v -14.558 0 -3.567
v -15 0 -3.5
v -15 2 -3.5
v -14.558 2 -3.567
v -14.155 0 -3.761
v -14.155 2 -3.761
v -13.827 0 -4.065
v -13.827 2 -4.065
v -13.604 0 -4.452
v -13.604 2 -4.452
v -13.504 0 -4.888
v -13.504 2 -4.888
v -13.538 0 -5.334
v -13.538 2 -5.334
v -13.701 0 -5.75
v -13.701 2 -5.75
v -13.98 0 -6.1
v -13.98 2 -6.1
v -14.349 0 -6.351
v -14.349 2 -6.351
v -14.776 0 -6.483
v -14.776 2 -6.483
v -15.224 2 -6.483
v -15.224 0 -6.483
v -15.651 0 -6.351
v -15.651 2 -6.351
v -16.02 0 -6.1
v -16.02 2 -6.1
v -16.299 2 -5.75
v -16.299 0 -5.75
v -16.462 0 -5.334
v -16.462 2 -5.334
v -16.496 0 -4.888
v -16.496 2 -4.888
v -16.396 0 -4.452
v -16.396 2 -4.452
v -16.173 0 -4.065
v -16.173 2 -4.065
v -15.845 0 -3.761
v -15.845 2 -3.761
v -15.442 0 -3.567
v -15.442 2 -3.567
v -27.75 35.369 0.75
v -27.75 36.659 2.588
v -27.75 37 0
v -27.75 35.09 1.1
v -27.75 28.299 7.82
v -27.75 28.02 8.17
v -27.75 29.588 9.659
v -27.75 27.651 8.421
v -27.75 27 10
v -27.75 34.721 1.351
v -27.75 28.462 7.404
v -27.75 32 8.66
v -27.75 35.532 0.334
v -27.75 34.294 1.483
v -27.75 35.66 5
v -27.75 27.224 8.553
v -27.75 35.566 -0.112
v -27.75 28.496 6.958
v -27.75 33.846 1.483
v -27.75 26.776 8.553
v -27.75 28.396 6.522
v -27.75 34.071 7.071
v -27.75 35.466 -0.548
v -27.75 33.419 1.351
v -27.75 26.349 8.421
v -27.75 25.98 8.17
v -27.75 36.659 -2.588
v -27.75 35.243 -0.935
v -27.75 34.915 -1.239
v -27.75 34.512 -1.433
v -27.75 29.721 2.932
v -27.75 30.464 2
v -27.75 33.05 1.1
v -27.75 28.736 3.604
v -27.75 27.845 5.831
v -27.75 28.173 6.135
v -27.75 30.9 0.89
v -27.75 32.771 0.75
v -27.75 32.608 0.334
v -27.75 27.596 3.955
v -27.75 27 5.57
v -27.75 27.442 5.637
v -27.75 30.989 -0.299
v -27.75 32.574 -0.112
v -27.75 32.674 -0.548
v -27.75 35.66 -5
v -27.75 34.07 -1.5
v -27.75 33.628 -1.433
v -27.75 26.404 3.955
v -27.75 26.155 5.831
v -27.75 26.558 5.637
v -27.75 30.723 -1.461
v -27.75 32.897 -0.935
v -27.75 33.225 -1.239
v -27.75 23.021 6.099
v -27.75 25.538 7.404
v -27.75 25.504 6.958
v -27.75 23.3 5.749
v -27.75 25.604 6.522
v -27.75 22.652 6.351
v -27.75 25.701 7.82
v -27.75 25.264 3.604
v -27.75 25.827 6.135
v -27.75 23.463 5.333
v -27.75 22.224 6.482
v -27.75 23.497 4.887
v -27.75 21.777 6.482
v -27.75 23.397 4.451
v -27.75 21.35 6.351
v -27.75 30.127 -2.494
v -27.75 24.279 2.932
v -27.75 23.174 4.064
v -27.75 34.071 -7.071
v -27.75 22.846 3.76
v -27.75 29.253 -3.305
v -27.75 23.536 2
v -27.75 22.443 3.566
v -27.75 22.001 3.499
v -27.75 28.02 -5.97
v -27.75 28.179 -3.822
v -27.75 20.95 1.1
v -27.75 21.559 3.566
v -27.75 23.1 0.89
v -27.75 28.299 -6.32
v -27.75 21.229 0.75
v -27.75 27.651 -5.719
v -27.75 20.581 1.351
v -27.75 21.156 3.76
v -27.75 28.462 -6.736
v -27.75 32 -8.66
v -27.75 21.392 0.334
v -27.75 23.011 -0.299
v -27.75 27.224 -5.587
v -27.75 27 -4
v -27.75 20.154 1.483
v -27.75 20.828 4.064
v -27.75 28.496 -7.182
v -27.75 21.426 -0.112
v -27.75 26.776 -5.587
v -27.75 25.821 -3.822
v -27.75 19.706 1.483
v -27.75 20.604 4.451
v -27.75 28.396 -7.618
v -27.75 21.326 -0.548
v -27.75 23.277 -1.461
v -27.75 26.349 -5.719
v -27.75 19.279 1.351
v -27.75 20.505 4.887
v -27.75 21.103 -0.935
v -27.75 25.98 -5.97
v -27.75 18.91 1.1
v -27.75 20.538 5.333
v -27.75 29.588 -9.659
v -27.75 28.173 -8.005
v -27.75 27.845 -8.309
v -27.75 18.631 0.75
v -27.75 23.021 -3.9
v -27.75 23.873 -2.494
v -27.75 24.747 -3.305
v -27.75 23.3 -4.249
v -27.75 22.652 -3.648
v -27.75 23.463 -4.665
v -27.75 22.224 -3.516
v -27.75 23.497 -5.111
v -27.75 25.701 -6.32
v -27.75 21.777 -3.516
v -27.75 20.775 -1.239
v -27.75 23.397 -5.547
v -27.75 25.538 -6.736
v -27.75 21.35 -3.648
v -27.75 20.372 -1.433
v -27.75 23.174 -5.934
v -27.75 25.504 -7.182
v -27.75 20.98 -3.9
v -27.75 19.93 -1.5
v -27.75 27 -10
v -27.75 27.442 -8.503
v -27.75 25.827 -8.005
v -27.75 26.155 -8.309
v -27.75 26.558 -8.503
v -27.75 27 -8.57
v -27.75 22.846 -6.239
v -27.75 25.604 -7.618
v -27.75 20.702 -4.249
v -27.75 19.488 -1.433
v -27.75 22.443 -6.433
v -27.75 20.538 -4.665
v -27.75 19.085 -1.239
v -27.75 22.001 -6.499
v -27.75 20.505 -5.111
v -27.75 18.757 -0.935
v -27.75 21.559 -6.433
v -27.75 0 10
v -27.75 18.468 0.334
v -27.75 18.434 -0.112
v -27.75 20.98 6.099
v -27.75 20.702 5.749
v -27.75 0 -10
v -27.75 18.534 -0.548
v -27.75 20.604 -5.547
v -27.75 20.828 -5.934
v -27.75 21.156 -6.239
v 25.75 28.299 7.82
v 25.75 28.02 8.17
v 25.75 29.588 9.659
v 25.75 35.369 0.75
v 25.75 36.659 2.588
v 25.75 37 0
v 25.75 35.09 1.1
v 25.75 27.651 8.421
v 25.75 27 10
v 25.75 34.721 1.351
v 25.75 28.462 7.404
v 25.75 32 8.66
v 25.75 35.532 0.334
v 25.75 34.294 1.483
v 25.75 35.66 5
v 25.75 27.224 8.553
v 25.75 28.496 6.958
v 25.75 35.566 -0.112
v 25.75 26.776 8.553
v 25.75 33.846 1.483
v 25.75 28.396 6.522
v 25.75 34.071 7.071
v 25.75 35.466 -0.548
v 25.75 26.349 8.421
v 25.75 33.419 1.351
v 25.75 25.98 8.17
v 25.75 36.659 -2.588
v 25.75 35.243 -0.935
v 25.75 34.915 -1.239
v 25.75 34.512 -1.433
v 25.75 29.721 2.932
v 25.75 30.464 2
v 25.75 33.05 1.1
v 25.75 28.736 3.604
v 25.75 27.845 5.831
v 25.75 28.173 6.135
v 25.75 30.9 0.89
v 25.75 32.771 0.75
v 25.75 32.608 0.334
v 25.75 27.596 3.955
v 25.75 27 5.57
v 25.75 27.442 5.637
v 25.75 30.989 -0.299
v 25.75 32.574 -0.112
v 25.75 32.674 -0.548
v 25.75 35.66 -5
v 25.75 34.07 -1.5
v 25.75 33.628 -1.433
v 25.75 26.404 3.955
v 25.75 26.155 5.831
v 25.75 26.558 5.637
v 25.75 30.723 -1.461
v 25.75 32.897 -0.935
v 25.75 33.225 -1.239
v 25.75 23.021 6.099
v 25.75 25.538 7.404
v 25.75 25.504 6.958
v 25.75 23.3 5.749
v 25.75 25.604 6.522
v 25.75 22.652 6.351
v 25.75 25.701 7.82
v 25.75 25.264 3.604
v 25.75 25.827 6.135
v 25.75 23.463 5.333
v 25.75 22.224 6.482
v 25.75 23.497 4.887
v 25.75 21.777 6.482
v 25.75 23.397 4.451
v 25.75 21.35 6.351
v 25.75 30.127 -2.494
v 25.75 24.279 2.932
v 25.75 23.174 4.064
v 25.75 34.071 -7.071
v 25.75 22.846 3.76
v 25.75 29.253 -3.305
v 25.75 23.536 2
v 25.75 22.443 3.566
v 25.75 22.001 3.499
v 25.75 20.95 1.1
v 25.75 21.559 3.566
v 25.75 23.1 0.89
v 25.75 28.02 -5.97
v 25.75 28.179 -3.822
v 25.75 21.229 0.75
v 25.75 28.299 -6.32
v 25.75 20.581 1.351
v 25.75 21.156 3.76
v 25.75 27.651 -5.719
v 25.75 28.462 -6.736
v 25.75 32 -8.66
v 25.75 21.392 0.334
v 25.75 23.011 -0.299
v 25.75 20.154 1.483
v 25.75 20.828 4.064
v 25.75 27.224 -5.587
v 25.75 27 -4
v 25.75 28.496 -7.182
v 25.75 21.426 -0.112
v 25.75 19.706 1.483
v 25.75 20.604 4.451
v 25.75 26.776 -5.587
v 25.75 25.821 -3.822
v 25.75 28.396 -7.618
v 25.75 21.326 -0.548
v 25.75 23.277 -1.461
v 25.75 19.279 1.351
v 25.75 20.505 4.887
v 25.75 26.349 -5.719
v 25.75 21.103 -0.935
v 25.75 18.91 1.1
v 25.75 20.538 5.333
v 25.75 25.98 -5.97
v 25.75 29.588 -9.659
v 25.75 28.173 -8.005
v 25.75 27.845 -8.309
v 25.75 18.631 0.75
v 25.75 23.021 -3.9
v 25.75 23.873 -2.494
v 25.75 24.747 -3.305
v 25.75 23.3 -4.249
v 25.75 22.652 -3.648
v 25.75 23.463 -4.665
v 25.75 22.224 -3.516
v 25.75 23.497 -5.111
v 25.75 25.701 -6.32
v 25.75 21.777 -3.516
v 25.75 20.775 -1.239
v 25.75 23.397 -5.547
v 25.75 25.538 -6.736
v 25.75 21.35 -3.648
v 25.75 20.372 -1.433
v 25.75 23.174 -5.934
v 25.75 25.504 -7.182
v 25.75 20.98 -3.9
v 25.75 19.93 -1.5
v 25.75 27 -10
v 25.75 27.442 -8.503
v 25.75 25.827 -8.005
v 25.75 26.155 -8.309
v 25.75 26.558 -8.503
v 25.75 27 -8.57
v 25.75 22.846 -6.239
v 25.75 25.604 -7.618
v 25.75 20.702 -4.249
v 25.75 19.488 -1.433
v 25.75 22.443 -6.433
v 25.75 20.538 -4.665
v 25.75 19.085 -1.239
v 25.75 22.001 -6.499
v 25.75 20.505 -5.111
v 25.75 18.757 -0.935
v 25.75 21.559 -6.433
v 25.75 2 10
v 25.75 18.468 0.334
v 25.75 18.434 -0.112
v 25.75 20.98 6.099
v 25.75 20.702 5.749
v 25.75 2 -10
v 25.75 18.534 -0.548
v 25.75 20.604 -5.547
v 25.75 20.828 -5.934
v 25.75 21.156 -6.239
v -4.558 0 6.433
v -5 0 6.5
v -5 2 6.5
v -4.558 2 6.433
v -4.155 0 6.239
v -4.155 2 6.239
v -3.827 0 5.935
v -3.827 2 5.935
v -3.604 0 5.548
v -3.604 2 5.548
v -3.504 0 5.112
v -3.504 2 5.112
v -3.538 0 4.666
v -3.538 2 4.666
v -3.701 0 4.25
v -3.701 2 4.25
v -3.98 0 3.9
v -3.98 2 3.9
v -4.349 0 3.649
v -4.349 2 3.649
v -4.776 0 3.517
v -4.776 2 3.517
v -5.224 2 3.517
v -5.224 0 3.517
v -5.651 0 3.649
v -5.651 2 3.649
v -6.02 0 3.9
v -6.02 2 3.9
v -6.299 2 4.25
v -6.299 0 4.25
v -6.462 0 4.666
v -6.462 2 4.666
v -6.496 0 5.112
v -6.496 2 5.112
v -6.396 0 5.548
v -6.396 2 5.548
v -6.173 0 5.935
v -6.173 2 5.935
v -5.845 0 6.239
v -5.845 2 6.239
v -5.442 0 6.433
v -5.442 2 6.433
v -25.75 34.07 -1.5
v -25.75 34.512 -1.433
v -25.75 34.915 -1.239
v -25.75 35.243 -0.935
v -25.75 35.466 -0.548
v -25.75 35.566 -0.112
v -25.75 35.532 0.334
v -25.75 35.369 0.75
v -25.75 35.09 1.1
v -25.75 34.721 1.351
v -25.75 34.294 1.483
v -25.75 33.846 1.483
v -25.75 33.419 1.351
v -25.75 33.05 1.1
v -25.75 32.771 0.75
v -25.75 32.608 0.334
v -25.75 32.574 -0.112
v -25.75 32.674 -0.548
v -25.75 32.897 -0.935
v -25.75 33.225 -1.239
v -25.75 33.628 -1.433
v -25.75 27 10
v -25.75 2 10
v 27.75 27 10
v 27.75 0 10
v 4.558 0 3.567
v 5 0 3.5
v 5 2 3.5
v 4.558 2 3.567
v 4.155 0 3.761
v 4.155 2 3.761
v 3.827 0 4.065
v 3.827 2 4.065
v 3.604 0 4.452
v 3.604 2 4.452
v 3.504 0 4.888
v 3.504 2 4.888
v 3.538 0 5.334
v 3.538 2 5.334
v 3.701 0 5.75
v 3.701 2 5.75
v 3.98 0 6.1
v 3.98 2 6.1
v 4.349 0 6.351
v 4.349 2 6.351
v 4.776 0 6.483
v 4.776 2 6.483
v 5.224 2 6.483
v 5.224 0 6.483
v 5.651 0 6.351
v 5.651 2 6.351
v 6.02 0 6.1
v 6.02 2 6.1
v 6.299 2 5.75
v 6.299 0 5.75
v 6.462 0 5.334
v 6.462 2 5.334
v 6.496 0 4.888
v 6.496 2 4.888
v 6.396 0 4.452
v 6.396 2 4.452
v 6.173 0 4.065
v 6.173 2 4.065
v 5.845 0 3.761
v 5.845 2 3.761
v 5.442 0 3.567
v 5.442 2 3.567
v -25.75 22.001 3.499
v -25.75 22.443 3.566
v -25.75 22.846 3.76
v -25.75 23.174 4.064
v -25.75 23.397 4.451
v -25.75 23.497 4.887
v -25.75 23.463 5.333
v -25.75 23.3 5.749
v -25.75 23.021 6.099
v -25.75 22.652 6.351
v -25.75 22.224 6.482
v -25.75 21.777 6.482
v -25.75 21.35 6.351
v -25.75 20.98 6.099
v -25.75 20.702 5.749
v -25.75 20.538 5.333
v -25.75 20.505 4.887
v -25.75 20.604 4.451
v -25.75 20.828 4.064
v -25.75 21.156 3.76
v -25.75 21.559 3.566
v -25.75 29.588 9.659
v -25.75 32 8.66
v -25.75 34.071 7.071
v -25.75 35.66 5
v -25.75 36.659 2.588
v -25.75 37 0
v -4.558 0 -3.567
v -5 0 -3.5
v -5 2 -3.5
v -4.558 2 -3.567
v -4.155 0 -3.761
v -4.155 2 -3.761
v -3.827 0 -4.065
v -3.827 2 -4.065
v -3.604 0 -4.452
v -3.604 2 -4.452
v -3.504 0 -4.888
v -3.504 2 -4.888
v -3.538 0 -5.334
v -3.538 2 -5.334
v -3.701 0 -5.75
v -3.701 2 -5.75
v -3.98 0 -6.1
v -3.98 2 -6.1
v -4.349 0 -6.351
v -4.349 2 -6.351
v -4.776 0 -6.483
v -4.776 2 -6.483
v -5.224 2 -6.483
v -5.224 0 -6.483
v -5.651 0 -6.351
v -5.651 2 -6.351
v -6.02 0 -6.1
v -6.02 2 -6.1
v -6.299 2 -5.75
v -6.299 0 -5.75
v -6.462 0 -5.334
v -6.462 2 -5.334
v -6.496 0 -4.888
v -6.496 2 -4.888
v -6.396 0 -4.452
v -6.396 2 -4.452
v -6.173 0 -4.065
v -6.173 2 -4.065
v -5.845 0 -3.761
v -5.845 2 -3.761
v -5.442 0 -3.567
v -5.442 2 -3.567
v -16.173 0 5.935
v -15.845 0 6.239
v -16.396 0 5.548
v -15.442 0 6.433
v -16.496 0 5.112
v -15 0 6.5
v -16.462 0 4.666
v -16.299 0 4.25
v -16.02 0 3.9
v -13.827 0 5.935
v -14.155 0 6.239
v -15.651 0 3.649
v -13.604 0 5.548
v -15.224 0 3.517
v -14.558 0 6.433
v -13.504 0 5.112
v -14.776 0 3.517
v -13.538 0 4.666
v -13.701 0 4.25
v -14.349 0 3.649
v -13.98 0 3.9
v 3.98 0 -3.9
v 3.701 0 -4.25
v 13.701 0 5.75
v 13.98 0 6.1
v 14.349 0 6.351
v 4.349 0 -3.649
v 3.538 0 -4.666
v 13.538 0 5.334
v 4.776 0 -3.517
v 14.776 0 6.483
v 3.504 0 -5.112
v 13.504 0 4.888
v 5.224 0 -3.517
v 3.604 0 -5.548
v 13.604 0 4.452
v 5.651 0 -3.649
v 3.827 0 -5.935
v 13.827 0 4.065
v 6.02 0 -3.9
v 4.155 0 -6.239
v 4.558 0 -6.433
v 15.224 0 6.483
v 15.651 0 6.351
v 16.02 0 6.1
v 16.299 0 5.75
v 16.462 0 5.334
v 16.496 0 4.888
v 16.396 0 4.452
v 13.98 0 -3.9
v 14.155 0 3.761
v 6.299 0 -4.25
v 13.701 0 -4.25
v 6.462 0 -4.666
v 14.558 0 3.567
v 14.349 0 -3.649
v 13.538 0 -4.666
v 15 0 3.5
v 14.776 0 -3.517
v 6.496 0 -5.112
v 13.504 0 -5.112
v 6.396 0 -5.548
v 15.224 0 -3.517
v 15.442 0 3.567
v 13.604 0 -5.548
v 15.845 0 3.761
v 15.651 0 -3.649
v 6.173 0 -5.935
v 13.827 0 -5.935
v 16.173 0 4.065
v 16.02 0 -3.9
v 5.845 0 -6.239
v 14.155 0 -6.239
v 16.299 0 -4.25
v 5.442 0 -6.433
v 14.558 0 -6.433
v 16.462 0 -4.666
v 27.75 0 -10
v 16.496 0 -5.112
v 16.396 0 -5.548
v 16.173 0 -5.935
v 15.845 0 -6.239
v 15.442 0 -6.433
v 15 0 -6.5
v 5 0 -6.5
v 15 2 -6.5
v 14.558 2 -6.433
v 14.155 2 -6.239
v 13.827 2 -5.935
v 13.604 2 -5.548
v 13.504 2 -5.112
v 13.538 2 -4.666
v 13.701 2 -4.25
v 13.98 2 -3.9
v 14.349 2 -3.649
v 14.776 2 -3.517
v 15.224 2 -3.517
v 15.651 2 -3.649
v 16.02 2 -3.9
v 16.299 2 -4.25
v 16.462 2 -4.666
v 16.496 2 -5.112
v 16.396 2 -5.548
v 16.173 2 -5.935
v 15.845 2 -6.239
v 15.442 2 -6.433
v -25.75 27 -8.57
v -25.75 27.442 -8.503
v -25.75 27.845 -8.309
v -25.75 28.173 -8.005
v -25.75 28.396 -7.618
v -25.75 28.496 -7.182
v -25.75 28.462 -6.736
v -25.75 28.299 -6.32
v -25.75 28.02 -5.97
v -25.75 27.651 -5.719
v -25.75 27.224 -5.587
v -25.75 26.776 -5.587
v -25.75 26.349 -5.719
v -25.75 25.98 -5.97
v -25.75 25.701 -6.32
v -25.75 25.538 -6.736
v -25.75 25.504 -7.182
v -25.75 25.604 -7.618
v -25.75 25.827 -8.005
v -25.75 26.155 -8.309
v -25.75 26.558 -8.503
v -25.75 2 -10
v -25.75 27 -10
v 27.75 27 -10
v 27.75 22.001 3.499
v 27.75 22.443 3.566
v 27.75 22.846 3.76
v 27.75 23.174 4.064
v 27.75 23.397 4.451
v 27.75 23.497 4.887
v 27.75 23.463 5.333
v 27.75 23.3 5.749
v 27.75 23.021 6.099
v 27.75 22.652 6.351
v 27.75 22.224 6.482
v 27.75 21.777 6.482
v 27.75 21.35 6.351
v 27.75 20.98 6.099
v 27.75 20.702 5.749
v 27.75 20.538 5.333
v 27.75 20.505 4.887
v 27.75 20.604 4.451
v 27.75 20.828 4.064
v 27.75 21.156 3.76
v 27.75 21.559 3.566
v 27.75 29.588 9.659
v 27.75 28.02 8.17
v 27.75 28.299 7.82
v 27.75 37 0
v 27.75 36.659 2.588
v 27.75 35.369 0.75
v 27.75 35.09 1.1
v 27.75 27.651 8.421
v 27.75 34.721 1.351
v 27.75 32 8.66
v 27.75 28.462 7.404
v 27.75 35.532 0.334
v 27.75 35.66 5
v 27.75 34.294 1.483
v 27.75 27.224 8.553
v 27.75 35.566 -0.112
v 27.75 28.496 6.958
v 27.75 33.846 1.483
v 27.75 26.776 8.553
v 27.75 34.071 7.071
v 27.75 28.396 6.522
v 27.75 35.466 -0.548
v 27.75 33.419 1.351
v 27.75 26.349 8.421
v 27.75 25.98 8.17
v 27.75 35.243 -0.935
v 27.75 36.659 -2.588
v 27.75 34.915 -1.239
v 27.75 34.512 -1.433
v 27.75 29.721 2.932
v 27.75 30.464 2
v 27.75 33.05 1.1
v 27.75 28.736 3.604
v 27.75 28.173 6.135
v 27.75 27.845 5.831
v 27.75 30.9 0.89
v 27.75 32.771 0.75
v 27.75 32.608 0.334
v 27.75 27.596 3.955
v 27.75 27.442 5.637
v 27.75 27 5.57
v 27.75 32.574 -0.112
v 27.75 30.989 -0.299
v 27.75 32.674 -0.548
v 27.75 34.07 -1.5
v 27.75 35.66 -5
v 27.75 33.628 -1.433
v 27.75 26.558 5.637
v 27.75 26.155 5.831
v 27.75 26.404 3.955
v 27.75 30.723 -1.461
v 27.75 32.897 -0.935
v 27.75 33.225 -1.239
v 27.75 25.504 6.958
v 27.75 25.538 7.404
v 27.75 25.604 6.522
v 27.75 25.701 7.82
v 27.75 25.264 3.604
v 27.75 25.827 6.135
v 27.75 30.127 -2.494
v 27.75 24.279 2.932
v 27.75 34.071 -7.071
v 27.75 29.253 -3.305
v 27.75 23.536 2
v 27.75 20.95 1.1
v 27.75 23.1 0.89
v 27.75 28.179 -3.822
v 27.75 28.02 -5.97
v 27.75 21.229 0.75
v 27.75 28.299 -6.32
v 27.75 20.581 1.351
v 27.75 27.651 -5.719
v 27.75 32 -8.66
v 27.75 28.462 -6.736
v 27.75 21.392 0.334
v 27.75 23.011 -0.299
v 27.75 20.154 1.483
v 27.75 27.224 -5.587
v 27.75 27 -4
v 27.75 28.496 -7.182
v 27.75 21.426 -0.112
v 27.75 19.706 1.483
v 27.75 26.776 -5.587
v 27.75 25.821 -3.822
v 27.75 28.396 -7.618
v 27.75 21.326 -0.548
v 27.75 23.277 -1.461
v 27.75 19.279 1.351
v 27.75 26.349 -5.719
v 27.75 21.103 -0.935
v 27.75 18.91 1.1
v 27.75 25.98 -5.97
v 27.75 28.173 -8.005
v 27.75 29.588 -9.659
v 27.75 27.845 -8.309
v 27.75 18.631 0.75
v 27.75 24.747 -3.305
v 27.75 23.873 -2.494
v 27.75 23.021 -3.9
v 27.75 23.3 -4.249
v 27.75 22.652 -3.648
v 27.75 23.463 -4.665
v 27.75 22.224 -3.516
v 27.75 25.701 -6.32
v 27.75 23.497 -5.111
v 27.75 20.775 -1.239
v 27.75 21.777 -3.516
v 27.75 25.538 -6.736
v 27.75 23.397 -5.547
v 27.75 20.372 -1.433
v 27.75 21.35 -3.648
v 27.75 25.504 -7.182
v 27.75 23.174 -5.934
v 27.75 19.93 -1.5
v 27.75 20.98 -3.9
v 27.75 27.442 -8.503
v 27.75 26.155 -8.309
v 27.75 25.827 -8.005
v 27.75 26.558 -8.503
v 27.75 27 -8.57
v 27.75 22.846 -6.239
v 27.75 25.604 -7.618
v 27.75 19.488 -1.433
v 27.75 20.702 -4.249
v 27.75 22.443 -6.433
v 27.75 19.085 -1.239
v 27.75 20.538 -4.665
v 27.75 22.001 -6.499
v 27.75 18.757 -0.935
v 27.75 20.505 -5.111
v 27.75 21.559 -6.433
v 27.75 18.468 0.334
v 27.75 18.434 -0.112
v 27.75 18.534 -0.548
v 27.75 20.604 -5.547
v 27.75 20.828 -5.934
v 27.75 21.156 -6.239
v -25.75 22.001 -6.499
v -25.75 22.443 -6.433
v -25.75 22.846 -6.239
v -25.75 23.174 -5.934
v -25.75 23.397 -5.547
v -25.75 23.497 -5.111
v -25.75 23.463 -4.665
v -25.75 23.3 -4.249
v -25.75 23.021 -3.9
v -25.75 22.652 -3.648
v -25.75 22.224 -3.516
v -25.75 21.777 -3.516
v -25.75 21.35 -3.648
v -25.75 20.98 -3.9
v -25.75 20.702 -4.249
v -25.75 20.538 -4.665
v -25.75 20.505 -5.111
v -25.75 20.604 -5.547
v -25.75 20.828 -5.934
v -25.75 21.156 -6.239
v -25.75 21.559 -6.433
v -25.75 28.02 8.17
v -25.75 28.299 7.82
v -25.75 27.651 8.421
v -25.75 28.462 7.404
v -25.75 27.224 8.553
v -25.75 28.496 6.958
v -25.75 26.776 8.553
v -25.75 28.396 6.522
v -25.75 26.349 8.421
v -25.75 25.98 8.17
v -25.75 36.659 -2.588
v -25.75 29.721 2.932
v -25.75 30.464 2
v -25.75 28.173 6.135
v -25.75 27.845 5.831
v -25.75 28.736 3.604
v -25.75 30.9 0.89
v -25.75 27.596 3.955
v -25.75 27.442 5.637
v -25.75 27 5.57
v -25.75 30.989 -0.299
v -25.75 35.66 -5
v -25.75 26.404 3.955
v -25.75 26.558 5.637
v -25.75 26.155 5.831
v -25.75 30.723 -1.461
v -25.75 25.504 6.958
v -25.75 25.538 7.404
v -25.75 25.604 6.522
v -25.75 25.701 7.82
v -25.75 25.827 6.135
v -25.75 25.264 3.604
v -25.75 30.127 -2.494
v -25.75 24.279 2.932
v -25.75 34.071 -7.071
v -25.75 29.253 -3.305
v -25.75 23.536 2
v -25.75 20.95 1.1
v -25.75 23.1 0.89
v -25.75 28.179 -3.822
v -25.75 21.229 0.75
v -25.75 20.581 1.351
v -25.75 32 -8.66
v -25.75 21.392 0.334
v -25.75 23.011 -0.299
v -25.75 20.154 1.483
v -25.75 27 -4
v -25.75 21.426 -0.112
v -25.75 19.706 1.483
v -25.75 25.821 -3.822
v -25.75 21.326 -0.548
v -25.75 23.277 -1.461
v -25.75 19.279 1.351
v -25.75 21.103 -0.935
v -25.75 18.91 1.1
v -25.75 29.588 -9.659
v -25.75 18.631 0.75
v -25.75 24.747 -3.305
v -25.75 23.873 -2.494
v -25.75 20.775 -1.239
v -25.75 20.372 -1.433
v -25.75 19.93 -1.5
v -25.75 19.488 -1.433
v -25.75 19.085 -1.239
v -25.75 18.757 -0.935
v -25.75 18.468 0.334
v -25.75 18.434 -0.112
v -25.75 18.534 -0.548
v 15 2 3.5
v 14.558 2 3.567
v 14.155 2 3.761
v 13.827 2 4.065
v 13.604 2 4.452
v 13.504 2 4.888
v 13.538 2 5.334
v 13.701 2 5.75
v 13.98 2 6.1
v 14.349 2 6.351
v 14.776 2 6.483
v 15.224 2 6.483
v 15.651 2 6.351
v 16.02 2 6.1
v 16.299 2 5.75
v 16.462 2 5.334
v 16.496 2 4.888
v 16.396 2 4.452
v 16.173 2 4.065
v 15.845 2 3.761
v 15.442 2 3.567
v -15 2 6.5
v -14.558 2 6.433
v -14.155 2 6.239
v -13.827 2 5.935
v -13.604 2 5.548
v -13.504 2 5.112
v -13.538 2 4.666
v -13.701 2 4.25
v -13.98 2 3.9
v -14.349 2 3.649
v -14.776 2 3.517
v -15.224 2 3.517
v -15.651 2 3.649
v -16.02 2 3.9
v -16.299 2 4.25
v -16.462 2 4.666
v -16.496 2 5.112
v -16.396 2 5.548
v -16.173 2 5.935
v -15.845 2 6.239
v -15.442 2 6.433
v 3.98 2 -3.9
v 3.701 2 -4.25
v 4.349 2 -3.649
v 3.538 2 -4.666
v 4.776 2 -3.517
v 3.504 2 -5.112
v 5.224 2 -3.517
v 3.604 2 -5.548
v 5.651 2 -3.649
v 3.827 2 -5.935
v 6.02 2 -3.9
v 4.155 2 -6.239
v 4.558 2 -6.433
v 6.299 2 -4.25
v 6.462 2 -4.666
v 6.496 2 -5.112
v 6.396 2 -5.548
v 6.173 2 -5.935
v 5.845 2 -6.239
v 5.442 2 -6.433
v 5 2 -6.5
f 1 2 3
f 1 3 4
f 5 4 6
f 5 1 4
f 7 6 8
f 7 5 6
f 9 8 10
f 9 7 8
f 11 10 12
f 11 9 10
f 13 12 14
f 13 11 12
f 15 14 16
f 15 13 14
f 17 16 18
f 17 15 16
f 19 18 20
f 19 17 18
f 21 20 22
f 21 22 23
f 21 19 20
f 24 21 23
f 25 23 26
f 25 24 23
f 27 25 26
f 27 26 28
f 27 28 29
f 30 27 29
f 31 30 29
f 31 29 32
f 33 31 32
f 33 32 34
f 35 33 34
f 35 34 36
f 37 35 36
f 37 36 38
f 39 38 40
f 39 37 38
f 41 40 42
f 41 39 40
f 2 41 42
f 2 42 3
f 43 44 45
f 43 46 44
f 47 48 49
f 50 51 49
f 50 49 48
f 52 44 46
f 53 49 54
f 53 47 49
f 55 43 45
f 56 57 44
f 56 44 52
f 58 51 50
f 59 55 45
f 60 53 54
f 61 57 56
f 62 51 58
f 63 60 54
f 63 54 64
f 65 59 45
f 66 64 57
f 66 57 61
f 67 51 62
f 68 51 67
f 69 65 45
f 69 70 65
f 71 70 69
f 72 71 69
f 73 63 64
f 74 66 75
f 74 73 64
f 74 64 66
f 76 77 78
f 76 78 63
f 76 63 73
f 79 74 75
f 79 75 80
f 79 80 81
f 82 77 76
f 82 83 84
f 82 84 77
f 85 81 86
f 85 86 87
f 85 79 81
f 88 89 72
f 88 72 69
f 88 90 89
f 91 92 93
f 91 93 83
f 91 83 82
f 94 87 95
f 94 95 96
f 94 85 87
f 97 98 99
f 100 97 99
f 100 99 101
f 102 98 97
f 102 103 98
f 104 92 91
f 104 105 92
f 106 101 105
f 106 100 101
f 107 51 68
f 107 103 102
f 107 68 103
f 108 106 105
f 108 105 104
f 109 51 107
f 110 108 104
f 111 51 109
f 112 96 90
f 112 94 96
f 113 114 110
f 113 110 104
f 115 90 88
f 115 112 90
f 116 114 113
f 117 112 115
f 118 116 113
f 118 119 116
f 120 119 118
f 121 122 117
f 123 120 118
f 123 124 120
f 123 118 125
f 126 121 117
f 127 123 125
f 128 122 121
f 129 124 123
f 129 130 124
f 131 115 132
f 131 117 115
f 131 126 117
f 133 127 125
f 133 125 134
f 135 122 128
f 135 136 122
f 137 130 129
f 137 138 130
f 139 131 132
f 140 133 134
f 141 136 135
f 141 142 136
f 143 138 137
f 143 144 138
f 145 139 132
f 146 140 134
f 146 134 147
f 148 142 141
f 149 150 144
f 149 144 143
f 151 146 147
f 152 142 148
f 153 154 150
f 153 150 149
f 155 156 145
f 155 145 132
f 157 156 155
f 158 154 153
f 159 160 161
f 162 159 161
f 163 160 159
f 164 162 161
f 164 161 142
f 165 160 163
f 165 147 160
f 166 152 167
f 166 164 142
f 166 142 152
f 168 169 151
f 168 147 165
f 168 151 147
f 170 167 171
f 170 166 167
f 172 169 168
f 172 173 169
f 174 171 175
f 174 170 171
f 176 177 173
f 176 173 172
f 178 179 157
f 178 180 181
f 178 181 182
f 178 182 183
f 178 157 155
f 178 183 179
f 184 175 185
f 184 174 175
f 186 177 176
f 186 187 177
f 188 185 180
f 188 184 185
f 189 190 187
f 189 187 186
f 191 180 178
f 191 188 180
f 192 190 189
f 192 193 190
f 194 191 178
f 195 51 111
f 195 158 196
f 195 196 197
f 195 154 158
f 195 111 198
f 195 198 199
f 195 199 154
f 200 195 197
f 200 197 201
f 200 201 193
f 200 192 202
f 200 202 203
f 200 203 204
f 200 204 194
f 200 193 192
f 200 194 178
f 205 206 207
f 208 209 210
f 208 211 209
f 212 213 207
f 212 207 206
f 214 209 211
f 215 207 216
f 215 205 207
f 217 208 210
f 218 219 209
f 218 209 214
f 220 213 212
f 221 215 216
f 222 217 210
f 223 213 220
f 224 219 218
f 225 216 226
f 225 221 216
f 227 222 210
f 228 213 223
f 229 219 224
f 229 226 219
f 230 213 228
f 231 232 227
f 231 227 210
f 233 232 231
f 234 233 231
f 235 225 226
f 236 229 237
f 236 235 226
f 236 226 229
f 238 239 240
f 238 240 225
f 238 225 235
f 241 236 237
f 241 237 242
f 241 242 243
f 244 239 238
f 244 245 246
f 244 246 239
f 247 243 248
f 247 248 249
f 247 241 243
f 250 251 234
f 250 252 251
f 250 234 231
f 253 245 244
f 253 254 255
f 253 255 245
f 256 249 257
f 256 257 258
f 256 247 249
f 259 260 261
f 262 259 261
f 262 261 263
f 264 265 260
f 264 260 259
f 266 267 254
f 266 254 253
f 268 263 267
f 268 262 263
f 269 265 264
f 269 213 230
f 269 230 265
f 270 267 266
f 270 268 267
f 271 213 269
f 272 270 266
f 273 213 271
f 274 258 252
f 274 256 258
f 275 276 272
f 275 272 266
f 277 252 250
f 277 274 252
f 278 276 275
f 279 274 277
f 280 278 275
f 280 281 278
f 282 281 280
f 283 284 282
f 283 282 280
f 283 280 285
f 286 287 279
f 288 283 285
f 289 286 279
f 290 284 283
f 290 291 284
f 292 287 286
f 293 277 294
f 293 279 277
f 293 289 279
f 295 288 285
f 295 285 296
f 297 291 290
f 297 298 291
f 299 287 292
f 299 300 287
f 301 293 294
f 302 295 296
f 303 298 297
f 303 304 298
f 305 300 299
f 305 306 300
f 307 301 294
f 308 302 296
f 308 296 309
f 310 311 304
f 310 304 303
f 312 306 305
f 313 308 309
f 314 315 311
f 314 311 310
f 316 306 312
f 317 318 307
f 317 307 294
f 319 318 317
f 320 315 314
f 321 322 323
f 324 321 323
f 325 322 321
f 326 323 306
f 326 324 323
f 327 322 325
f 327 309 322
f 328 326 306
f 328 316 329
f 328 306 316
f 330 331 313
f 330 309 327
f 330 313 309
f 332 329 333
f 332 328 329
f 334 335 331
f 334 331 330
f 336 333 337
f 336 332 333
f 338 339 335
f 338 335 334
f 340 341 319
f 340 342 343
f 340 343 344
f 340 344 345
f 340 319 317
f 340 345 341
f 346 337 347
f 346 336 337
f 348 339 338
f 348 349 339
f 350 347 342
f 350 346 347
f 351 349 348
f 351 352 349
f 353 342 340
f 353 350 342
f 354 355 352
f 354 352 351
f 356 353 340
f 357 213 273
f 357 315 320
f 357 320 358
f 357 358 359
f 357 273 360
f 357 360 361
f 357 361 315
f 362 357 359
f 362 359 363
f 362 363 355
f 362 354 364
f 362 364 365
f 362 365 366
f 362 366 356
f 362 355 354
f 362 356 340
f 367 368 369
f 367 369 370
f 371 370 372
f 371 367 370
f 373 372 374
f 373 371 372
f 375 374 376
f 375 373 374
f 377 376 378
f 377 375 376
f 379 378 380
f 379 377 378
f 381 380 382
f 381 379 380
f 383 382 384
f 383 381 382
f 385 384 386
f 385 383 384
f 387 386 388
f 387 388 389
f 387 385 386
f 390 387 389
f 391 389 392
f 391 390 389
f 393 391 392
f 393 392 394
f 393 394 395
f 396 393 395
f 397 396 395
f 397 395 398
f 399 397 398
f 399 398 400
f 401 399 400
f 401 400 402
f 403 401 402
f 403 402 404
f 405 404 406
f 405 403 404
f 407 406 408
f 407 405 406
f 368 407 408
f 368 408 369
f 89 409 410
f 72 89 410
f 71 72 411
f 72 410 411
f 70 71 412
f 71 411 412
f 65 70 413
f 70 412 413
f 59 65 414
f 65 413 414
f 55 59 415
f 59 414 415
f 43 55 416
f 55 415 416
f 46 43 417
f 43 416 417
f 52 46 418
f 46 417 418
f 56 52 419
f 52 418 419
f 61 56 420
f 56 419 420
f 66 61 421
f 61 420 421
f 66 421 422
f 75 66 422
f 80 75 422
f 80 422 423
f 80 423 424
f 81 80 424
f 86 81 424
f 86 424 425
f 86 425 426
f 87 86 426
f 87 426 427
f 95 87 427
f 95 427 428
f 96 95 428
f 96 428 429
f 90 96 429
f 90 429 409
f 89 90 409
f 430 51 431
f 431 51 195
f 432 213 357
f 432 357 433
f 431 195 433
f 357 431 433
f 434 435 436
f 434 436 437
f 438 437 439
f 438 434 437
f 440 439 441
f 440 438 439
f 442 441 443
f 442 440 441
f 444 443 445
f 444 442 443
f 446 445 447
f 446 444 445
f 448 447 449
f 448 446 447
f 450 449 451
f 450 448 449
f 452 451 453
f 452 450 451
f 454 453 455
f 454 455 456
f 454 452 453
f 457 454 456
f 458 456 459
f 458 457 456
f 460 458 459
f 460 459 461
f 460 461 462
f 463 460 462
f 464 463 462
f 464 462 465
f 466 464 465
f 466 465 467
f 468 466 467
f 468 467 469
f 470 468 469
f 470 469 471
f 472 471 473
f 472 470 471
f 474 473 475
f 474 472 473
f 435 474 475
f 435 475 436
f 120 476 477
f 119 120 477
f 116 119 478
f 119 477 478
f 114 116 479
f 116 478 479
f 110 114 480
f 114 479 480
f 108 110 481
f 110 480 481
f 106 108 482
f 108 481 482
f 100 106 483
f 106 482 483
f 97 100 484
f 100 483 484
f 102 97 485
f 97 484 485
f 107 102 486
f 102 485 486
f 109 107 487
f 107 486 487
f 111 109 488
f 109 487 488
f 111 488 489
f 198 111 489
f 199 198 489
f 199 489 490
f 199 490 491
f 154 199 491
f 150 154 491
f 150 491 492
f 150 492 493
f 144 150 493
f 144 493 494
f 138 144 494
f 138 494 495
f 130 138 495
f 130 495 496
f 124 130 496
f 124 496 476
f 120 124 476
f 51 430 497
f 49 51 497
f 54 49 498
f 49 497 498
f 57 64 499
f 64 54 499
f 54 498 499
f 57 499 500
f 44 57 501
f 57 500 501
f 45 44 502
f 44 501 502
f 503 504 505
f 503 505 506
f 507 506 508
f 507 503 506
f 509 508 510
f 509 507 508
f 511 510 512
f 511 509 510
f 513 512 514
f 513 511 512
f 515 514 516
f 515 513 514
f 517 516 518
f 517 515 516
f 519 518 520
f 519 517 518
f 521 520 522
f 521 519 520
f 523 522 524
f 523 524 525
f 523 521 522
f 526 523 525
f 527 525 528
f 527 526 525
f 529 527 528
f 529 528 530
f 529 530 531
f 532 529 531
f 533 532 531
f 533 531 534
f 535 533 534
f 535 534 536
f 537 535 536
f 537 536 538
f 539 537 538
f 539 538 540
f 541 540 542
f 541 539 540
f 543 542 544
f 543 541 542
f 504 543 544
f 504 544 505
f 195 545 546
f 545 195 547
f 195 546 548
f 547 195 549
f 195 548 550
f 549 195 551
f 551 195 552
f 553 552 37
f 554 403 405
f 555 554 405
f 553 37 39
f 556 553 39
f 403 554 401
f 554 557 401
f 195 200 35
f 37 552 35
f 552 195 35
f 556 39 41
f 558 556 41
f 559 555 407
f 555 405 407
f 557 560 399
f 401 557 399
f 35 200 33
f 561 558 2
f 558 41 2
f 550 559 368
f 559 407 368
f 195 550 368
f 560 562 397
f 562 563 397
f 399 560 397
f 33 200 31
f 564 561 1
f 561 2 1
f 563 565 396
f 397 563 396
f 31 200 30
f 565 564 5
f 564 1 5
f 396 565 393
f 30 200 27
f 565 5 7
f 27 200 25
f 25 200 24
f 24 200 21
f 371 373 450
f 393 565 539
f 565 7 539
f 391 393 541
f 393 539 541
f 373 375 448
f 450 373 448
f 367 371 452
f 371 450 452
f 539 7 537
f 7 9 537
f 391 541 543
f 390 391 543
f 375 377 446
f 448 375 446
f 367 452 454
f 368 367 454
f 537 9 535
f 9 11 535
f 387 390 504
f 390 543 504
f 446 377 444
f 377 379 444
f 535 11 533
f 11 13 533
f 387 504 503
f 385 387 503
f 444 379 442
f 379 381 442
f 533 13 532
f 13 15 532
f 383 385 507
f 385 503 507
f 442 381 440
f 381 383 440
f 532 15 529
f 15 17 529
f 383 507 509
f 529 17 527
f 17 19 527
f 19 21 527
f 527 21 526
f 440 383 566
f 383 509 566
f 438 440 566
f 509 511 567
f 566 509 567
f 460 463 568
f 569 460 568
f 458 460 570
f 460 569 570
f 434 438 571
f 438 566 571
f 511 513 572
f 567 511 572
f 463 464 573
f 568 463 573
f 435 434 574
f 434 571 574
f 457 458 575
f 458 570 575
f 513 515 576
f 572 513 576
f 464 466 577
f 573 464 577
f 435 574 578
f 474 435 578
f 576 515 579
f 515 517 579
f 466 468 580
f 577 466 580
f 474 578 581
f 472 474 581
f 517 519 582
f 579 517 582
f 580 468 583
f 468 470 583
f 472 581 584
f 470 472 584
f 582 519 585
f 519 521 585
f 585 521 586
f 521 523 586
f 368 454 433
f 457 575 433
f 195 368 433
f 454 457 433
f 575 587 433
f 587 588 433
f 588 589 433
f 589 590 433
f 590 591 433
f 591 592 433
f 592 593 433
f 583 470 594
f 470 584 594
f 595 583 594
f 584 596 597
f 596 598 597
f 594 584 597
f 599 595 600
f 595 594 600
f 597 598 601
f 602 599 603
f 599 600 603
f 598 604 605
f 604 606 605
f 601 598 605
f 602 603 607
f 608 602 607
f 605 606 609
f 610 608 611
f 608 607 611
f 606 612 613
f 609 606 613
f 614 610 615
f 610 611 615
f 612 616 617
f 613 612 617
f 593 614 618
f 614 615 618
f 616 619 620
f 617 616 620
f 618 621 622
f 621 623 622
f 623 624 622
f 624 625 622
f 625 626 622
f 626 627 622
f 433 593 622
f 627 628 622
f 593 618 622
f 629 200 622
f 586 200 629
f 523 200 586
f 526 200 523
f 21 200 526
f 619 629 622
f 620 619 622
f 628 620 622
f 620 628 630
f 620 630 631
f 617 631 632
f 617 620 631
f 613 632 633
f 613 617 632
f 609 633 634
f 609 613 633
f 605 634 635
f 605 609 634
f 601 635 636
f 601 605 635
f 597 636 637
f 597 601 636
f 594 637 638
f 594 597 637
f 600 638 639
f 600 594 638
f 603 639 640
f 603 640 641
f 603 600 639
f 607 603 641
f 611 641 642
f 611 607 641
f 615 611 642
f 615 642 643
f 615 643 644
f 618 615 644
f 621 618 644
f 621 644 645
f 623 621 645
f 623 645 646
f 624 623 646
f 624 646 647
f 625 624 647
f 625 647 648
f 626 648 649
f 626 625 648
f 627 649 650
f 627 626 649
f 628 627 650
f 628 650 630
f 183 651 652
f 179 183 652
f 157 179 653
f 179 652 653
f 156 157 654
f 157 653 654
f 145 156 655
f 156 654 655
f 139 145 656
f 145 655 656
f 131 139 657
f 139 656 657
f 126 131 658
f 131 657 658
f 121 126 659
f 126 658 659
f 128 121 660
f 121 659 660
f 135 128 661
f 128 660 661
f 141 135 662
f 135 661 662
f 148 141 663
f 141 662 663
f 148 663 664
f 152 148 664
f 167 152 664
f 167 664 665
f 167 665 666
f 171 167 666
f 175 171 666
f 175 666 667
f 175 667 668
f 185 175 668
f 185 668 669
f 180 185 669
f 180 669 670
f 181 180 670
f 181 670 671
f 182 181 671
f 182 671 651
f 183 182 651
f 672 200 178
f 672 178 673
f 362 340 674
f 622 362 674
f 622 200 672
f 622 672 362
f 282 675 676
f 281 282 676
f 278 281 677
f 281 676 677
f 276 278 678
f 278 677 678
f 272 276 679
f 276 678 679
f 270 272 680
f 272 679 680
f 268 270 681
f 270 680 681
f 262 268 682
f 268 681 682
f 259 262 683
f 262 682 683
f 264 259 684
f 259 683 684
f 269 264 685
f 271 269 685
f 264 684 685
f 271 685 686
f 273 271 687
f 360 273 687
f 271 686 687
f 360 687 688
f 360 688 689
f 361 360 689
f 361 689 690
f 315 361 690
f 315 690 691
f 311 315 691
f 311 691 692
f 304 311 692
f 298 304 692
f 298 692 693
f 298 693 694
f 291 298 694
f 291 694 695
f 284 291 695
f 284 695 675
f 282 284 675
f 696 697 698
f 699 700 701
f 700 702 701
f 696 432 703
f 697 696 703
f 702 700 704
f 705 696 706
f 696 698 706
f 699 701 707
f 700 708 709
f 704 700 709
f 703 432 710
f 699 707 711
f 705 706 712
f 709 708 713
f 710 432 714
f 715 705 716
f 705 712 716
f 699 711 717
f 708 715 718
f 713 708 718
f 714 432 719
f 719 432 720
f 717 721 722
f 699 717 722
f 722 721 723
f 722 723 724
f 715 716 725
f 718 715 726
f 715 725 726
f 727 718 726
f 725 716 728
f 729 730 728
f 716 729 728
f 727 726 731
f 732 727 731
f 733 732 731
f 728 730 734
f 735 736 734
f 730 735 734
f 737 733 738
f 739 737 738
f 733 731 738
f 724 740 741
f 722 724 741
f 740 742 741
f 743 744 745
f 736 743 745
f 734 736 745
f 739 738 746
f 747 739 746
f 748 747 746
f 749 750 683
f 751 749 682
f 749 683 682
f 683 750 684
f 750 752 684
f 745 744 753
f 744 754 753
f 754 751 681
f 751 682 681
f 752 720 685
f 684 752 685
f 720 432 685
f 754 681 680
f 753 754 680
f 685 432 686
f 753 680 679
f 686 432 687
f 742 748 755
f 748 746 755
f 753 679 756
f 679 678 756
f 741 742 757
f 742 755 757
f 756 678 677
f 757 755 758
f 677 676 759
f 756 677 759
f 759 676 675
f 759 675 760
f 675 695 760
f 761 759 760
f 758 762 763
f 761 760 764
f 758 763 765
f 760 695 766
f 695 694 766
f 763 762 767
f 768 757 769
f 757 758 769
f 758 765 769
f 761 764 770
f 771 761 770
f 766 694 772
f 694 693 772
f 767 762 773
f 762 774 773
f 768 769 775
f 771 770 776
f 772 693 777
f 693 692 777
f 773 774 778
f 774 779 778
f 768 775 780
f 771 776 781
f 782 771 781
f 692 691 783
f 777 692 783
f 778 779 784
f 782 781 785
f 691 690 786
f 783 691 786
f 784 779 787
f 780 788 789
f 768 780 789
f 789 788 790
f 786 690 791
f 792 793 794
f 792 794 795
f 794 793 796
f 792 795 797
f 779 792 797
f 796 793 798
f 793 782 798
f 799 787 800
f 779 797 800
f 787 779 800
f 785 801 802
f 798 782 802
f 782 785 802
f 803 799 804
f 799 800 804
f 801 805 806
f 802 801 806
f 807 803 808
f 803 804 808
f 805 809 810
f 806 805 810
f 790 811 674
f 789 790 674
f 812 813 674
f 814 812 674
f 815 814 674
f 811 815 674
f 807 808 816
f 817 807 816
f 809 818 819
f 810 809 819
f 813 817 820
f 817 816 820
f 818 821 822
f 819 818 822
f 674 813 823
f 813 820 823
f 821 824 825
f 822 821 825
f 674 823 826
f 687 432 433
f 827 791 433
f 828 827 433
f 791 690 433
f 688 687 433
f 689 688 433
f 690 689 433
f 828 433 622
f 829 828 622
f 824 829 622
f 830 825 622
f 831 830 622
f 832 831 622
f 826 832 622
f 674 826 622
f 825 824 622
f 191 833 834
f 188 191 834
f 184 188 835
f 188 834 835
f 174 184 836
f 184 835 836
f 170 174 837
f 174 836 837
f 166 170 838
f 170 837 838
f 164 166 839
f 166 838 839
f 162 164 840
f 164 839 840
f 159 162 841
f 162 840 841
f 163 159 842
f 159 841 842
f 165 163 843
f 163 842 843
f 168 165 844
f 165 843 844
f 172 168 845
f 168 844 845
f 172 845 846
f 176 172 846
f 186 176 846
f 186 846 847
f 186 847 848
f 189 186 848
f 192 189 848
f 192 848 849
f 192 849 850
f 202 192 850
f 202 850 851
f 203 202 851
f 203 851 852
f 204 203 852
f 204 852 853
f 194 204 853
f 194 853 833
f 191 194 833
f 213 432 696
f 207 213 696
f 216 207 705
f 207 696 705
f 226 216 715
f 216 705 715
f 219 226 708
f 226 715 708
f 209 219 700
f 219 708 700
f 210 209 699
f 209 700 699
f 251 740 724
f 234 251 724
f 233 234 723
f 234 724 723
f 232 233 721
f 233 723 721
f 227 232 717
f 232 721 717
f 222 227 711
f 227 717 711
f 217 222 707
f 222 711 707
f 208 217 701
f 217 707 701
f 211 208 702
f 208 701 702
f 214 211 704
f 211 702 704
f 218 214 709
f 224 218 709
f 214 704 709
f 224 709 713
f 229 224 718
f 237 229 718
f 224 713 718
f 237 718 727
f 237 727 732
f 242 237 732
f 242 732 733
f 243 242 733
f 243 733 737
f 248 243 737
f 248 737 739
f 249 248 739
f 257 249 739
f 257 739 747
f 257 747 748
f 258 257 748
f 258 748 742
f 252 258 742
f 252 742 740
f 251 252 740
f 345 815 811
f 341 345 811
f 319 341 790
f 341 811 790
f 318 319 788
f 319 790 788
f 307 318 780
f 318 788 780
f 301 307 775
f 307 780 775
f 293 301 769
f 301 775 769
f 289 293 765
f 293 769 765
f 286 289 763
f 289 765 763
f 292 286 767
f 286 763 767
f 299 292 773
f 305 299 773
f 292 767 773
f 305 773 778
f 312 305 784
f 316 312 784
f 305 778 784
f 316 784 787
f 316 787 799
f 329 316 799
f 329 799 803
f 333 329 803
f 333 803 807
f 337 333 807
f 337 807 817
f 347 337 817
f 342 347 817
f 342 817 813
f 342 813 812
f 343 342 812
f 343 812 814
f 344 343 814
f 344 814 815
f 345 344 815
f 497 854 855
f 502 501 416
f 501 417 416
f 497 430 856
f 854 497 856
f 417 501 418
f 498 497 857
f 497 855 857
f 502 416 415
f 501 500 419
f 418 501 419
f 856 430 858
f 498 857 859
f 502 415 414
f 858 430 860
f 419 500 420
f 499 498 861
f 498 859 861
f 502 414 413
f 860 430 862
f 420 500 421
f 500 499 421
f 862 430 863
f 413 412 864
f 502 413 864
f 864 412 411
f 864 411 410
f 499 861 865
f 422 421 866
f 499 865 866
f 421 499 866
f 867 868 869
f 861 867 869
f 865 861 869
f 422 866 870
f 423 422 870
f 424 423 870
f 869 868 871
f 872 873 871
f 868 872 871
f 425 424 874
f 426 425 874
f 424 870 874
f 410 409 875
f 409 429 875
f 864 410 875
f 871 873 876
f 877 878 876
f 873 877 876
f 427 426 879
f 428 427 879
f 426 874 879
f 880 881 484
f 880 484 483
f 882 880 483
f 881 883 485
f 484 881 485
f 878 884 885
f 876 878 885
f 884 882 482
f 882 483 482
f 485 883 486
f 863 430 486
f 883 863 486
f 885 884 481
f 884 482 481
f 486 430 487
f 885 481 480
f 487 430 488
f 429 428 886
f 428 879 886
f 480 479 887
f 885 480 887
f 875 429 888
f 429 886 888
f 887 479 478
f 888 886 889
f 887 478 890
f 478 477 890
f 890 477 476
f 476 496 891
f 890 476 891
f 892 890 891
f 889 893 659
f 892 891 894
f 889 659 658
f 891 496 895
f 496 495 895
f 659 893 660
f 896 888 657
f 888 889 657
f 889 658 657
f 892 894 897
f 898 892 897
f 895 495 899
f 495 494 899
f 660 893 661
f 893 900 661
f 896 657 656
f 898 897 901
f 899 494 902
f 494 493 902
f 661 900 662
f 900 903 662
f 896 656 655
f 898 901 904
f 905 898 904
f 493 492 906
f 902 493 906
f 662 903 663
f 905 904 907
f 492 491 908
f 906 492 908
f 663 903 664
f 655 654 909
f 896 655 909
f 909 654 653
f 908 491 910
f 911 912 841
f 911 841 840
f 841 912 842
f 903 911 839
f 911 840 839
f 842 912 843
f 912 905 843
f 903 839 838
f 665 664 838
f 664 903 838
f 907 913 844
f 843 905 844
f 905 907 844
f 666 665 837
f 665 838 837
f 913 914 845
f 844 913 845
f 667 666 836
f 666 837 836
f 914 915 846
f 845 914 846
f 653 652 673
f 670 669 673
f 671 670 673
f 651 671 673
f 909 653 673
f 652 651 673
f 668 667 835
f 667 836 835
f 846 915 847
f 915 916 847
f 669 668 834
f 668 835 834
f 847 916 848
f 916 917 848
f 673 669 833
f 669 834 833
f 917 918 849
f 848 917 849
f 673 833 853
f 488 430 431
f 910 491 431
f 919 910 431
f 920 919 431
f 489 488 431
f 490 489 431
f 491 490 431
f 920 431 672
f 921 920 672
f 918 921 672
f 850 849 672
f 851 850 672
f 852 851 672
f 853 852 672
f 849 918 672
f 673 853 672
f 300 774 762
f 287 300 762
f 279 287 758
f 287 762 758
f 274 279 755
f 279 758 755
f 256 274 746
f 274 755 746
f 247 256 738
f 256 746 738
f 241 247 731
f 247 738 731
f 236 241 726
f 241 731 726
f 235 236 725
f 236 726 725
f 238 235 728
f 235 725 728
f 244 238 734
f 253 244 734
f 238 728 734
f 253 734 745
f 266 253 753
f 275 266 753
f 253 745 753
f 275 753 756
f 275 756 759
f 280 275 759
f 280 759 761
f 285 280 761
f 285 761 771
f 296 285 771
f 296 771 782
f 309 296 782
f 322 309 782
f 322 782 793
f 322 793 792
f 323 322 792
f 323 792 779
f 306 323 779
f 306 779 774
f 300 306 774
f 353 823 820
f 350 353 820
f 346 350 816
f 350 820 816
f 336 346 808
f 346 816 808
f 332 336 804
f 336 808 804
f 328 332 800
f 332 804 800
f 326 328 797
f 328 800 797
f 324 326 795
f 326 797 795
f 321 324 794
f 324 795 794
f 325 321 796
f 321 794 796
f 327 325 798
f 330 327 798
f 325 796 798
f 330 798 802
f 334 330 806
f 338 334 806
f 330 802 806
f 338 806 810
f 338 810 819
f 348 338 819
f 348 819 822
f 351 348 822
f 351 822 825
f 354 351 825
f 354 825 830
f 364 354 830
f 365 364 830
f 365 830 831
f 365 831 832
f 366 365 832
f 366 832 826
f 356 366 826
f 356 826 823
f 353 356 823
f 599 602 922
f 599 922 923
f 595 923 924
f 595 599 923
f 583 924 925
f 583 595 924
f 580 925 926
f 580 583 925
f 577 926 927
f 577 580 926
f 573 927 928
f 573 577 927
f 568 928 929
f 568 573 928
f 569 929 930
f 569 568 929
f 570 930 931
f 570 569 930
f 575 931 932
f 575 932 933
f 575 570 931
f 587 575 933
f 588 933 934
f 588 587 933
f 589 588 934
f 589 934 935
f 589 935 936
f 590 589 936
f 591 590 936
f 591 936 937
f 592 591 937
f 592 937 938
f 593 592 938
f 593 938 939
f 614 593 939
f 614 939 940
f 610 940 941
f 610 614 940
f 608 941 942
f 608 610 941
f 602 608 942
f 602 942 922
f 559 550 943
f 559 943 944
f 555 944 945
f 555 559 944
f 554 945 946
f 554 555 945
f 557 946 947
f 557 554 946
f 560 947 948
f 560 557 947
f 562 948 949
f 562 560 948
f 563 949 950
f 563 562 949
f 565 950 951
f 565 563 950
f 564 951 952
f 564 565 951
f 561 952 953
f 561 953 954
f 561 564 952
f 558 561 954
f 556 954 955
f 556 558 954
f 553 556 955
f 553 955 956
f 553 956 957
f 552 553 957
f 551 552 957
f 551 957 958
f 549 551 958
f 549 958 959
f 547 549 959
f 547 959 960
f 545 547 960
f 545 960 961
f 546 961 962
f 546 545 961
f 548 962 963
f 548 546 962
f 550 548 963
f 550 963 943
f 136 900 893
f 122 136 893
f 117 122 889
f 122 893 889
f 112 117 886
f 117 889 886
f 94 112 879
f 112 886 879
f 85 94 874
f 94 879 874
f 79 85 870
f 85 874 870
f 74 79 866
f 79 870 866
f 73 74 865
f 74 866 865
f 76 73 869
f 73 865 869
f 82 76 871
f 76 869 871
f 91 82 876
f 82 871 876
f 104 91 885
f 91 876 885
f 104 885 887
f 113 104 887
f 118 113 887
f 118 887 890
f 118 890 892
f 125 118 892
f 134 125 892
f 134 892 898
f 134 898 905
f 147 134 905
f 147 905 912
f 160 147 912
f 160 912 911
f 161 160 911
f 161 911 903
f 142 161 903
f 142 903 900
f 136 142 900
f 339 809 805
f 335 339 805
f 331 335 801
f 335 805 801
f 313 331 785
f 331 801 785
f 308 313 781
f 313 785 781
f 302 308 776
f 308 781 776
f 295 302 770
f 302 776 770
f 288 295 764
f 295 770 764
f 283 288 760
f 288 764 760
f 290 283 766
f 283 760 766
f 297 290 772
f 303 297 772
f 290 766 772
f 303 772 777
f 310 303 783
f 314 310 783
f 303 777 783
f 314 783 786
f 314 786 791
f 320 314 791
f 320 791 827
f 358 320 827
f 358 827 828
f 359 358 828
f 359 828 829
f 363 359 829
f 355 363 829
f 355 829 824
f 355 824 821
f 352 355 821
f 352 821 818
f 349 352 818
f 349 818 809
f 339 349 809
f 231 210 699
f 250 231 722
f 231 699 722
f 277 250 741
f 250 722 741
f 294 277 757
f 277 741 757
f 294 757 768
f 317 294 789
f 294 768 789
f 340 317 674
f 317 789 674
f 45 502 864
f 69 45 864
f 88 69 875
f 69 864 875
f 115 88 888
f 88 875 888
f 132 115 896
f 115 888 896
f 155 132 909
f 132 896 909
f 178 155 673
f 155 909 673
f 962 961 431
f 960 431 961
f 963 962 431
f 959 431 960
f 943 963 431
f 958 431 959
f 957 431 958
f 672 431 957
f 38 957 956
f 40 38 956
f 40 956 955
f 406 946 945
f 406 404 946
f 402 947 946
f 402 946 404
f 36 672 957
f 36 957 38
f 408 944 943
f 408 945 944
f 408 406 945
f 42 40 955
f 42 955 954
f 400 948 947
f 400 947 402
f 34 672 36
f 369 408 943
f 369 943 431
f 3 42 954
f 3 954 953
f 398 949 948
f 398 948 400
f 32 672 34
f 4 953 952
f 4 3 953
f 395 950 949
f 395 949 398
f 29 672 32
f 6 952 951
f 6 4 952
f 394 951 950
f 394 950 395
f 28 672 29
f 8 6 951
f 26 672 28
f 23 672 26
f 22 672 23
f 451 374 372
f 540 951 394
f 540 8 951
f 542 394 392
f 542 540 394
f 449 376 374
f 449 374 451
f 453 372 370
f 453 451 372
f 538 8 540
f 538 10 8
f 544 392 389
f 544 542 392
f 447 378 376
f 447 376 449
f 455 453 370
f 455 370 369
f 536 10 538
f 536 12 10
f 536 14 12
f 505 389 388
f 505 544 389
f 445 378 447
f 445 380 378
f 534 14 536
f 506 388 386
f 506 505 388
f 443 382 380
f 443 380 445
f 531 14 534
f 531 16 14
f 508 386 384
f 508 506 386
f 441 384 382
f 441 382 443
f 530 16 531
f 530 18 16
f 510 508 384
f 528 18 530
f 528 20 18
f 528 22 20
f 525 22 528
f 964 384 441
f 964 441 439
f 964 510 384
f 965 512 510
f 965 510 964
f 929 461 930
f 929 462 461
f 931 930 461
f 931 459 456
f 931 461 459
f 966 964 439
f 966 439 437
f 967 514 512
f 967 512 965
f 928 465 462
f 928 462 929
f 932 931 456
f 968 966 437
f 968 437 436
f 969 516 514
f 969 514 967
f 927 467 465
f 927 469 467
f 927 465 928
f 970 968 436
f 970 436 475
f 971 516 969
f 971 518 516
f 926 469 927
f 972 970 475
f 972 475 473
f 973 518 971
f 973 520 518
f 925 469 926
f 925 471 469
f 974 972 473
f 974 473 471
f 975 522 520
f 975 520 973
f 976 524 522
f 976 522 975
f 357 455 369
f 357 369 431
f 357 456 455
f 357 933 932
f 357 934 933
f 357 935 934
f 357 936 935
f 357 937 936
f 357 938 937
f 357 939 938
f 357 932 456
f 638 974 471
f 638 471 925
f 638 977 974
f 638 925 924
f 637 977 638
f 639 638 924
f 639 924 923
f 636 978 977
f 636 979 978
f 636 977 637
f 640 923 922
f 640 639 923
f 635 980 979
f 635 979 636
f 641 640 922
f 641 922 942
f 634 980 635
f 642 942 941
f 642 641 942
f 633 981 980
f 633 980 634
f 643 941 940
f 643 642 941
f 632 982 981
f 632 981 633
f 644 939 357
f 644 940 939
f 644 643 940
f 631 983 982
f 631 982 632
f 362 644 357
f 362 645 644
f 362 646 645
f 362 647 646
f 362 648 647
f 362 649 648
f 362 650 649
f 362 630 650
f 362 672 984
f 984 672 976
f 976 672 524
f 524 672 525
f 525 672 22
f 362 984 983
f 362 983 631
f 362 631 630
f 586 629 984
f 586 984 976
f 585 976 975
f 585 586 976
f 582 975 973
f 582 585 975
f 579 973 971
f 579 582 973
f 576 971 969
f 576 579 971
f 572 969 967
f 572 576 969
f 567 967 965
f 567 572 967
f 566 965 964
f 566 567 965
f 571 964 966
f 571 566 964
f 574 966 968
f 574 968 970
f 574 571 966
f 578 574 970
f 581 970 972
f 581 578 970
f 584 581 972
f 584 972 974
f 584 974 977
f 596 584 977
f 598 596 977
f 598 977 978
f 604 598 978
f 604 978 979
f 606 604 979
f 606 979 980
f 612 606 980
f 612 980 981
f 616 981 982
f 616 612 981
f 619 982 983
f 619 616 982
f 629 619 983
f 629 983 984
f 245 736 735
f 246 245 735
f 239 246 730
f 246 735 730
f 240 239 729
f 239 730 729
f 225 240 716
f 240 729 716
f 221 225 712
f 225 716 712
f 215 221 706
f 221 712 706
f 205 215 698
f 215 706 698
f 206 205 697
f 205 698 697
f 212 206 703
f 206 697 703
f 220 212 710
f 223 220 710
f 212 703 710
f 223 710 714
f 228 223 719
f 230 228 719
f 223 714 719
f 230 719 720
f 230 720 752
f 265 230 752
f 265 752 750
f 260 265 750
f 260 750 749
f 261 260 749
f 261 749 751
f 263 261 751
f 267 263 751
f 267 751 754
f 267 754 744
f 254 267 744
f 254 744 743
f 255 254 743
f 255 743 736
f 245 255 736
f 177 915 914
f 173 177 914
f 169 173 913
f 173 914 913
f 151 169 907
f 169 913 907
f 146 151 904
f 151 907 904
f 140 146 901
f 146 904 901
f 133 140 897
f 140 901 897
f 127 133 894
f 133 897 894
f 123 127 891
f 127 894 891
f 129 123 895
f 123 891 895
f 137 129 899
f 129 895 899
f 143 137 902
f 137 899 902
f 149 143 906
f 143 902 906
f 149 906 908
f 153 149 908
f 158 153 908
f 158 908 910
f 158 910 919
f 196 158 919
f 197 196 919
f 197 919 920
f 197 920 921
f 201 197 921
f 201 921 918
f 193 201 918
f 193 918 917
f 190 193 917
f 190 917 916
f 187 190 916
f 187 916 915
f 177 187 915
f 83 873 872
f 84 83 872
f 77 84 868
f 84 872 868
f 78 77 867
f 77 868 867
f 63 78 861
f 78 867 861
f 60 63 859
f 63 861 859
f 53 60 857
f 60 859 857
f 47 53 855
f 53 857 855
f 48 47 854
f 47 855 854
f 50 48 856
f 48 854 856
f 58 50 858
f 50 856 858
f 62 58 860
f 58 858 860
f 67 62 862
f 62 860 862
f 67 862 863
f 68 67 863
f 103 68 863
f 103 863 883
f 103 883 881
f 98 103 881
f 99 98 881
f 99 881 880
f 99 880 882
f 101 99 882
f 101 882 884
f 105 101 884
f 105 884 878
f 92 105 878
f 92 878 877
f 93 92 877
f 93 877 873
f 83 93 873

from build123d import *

# Parameters (mm, degrees)
SKETCH_2_W          = 55.5
SKETCH_2_H          = 20
SKETCH_2_R          = 1.5
EXTRUDE_1_DEPTH     = 2
SKETCH_3_W          = 2
SKETCH_3_H          = 20
EXTRUDE_2_DEPTH     = 35
SKETCH_4_R          = 1.5
SKETCH_4_R_2        = 4
CUT_EXTRUDE_1_DEPTH = 65


with BuildPart() as part:
    # 스케치2 → 보스-돌출1 (new body)
    with BuildSketch(Plane(origin=(0, 0, 0), x_dir=(1, 0, 0), z_dir=(0, 1, 0))):
        Rectangle(SKETCH_2_W, SKETCH_2_H)
        with Locations(Location((-15, 5, 0), (0, 0, 270))):
            Circle(SKETCH_2_R, mode=Mode.SUBTRACT)
        with Locations(Location((-5, 5, 0), (0, 0, 270))):
            Circle(SKETCH_2_R, mode=Mode.SUBTRACT)
        with Locations(Location((-15, -5, 0), (0, 0, 270))):
            Circle(SKETCH_2_R, mode=Mode.SUBTRACT)
        with Locations(Location((-5, -5, 0), (0, 0, 270))):
            Circle(SKETCH_2_R, mode=Mode.SUBTRACT)
        with Locations(Location((15, -5, 0), (0, 0, 90))):
            Circle(SKETCH_2_R, mode=Mode.SUBTRACT)
        with Locations(Location((5, -5, 0), (0, 0, 90))):
            Circle(SKETCH_2_R, mode=Mode.SUBTRACT)
        with Locations(Location((5, 5, 0), (0, 0, 90))):
            Circle(SKETCH_2_R, mode=Mode.SUBTRACT)
        with Locations(Location((15, 5, 0), (0, 0, 90))):
            Circle(SKETCH_2_R, mode=Mode.SUBTRACT)
    extrude(amount=EXTRUDE_1_DEPTH)

    # 스케치3 → 보스-돌출2 (add)
    with BuildSketch(Plane(origin=(0, 2, 0), x_dir=(1, 0, 0), z_dir=(0, 1, 0))):
        with Locations((-26.75, 0)):
            Rectangle(SKETCH_3_W, SKETCH_3_H)
        with Locations((26.75, 0)):
            Rectangle(SKETCH_3_W, SKETCH_3_H)
    extrude(amount=EXTRUDE_2_DEPTH)

    # 스케치4 → 컷-돌출1 (cut)
    with BuildSketch(Plane(origin=(27.75, 0, 0), x_dir=(0, 0, -1), z_dir=(1, 0, 0))):
        with BuildLine():
            Line((-10, 37), (-10, 27))
            ThreePointArc((-10, 27), (-7.071067815, 34.071067809), (-9e-09, 37))
            Line((-9e-09, 37), (-10, 37))
        make_face()
        with BuildLine():
            Line((10, 37), (-9e-09, 37))
            ThreePointArc((-9e-09, 37), (7.071067809, 34.071067815), (10, 27))
            Line((10, 27), (10, 37))
        make_face()
        with Locations((7.07, 27)):
            Circle(SKETCH_4_R)
        with Locations((0, 27)):
            Circle(SKETCH_4_R_2)
        with Locations((0, 34.07)):
            Circle(SKETCH_4_R)
        with Locations((4.999244943, 22.000755057)):
            Circle(SKETCH_4_R)
        with Locations((0, 19.93)):
            Circle(SKETCH_4_R)
        with Locations((-4.999244943, 22.000755057)):
            Circle(SKETCH_4_R)
        with Locations((-7.07, 27)):
            Circle(SKETCH_4_R)
    extrude(amount=-CUT_EXTRUDE_1_DEPTH, mode=Mode.SUBTRACT)


solid = part.part
